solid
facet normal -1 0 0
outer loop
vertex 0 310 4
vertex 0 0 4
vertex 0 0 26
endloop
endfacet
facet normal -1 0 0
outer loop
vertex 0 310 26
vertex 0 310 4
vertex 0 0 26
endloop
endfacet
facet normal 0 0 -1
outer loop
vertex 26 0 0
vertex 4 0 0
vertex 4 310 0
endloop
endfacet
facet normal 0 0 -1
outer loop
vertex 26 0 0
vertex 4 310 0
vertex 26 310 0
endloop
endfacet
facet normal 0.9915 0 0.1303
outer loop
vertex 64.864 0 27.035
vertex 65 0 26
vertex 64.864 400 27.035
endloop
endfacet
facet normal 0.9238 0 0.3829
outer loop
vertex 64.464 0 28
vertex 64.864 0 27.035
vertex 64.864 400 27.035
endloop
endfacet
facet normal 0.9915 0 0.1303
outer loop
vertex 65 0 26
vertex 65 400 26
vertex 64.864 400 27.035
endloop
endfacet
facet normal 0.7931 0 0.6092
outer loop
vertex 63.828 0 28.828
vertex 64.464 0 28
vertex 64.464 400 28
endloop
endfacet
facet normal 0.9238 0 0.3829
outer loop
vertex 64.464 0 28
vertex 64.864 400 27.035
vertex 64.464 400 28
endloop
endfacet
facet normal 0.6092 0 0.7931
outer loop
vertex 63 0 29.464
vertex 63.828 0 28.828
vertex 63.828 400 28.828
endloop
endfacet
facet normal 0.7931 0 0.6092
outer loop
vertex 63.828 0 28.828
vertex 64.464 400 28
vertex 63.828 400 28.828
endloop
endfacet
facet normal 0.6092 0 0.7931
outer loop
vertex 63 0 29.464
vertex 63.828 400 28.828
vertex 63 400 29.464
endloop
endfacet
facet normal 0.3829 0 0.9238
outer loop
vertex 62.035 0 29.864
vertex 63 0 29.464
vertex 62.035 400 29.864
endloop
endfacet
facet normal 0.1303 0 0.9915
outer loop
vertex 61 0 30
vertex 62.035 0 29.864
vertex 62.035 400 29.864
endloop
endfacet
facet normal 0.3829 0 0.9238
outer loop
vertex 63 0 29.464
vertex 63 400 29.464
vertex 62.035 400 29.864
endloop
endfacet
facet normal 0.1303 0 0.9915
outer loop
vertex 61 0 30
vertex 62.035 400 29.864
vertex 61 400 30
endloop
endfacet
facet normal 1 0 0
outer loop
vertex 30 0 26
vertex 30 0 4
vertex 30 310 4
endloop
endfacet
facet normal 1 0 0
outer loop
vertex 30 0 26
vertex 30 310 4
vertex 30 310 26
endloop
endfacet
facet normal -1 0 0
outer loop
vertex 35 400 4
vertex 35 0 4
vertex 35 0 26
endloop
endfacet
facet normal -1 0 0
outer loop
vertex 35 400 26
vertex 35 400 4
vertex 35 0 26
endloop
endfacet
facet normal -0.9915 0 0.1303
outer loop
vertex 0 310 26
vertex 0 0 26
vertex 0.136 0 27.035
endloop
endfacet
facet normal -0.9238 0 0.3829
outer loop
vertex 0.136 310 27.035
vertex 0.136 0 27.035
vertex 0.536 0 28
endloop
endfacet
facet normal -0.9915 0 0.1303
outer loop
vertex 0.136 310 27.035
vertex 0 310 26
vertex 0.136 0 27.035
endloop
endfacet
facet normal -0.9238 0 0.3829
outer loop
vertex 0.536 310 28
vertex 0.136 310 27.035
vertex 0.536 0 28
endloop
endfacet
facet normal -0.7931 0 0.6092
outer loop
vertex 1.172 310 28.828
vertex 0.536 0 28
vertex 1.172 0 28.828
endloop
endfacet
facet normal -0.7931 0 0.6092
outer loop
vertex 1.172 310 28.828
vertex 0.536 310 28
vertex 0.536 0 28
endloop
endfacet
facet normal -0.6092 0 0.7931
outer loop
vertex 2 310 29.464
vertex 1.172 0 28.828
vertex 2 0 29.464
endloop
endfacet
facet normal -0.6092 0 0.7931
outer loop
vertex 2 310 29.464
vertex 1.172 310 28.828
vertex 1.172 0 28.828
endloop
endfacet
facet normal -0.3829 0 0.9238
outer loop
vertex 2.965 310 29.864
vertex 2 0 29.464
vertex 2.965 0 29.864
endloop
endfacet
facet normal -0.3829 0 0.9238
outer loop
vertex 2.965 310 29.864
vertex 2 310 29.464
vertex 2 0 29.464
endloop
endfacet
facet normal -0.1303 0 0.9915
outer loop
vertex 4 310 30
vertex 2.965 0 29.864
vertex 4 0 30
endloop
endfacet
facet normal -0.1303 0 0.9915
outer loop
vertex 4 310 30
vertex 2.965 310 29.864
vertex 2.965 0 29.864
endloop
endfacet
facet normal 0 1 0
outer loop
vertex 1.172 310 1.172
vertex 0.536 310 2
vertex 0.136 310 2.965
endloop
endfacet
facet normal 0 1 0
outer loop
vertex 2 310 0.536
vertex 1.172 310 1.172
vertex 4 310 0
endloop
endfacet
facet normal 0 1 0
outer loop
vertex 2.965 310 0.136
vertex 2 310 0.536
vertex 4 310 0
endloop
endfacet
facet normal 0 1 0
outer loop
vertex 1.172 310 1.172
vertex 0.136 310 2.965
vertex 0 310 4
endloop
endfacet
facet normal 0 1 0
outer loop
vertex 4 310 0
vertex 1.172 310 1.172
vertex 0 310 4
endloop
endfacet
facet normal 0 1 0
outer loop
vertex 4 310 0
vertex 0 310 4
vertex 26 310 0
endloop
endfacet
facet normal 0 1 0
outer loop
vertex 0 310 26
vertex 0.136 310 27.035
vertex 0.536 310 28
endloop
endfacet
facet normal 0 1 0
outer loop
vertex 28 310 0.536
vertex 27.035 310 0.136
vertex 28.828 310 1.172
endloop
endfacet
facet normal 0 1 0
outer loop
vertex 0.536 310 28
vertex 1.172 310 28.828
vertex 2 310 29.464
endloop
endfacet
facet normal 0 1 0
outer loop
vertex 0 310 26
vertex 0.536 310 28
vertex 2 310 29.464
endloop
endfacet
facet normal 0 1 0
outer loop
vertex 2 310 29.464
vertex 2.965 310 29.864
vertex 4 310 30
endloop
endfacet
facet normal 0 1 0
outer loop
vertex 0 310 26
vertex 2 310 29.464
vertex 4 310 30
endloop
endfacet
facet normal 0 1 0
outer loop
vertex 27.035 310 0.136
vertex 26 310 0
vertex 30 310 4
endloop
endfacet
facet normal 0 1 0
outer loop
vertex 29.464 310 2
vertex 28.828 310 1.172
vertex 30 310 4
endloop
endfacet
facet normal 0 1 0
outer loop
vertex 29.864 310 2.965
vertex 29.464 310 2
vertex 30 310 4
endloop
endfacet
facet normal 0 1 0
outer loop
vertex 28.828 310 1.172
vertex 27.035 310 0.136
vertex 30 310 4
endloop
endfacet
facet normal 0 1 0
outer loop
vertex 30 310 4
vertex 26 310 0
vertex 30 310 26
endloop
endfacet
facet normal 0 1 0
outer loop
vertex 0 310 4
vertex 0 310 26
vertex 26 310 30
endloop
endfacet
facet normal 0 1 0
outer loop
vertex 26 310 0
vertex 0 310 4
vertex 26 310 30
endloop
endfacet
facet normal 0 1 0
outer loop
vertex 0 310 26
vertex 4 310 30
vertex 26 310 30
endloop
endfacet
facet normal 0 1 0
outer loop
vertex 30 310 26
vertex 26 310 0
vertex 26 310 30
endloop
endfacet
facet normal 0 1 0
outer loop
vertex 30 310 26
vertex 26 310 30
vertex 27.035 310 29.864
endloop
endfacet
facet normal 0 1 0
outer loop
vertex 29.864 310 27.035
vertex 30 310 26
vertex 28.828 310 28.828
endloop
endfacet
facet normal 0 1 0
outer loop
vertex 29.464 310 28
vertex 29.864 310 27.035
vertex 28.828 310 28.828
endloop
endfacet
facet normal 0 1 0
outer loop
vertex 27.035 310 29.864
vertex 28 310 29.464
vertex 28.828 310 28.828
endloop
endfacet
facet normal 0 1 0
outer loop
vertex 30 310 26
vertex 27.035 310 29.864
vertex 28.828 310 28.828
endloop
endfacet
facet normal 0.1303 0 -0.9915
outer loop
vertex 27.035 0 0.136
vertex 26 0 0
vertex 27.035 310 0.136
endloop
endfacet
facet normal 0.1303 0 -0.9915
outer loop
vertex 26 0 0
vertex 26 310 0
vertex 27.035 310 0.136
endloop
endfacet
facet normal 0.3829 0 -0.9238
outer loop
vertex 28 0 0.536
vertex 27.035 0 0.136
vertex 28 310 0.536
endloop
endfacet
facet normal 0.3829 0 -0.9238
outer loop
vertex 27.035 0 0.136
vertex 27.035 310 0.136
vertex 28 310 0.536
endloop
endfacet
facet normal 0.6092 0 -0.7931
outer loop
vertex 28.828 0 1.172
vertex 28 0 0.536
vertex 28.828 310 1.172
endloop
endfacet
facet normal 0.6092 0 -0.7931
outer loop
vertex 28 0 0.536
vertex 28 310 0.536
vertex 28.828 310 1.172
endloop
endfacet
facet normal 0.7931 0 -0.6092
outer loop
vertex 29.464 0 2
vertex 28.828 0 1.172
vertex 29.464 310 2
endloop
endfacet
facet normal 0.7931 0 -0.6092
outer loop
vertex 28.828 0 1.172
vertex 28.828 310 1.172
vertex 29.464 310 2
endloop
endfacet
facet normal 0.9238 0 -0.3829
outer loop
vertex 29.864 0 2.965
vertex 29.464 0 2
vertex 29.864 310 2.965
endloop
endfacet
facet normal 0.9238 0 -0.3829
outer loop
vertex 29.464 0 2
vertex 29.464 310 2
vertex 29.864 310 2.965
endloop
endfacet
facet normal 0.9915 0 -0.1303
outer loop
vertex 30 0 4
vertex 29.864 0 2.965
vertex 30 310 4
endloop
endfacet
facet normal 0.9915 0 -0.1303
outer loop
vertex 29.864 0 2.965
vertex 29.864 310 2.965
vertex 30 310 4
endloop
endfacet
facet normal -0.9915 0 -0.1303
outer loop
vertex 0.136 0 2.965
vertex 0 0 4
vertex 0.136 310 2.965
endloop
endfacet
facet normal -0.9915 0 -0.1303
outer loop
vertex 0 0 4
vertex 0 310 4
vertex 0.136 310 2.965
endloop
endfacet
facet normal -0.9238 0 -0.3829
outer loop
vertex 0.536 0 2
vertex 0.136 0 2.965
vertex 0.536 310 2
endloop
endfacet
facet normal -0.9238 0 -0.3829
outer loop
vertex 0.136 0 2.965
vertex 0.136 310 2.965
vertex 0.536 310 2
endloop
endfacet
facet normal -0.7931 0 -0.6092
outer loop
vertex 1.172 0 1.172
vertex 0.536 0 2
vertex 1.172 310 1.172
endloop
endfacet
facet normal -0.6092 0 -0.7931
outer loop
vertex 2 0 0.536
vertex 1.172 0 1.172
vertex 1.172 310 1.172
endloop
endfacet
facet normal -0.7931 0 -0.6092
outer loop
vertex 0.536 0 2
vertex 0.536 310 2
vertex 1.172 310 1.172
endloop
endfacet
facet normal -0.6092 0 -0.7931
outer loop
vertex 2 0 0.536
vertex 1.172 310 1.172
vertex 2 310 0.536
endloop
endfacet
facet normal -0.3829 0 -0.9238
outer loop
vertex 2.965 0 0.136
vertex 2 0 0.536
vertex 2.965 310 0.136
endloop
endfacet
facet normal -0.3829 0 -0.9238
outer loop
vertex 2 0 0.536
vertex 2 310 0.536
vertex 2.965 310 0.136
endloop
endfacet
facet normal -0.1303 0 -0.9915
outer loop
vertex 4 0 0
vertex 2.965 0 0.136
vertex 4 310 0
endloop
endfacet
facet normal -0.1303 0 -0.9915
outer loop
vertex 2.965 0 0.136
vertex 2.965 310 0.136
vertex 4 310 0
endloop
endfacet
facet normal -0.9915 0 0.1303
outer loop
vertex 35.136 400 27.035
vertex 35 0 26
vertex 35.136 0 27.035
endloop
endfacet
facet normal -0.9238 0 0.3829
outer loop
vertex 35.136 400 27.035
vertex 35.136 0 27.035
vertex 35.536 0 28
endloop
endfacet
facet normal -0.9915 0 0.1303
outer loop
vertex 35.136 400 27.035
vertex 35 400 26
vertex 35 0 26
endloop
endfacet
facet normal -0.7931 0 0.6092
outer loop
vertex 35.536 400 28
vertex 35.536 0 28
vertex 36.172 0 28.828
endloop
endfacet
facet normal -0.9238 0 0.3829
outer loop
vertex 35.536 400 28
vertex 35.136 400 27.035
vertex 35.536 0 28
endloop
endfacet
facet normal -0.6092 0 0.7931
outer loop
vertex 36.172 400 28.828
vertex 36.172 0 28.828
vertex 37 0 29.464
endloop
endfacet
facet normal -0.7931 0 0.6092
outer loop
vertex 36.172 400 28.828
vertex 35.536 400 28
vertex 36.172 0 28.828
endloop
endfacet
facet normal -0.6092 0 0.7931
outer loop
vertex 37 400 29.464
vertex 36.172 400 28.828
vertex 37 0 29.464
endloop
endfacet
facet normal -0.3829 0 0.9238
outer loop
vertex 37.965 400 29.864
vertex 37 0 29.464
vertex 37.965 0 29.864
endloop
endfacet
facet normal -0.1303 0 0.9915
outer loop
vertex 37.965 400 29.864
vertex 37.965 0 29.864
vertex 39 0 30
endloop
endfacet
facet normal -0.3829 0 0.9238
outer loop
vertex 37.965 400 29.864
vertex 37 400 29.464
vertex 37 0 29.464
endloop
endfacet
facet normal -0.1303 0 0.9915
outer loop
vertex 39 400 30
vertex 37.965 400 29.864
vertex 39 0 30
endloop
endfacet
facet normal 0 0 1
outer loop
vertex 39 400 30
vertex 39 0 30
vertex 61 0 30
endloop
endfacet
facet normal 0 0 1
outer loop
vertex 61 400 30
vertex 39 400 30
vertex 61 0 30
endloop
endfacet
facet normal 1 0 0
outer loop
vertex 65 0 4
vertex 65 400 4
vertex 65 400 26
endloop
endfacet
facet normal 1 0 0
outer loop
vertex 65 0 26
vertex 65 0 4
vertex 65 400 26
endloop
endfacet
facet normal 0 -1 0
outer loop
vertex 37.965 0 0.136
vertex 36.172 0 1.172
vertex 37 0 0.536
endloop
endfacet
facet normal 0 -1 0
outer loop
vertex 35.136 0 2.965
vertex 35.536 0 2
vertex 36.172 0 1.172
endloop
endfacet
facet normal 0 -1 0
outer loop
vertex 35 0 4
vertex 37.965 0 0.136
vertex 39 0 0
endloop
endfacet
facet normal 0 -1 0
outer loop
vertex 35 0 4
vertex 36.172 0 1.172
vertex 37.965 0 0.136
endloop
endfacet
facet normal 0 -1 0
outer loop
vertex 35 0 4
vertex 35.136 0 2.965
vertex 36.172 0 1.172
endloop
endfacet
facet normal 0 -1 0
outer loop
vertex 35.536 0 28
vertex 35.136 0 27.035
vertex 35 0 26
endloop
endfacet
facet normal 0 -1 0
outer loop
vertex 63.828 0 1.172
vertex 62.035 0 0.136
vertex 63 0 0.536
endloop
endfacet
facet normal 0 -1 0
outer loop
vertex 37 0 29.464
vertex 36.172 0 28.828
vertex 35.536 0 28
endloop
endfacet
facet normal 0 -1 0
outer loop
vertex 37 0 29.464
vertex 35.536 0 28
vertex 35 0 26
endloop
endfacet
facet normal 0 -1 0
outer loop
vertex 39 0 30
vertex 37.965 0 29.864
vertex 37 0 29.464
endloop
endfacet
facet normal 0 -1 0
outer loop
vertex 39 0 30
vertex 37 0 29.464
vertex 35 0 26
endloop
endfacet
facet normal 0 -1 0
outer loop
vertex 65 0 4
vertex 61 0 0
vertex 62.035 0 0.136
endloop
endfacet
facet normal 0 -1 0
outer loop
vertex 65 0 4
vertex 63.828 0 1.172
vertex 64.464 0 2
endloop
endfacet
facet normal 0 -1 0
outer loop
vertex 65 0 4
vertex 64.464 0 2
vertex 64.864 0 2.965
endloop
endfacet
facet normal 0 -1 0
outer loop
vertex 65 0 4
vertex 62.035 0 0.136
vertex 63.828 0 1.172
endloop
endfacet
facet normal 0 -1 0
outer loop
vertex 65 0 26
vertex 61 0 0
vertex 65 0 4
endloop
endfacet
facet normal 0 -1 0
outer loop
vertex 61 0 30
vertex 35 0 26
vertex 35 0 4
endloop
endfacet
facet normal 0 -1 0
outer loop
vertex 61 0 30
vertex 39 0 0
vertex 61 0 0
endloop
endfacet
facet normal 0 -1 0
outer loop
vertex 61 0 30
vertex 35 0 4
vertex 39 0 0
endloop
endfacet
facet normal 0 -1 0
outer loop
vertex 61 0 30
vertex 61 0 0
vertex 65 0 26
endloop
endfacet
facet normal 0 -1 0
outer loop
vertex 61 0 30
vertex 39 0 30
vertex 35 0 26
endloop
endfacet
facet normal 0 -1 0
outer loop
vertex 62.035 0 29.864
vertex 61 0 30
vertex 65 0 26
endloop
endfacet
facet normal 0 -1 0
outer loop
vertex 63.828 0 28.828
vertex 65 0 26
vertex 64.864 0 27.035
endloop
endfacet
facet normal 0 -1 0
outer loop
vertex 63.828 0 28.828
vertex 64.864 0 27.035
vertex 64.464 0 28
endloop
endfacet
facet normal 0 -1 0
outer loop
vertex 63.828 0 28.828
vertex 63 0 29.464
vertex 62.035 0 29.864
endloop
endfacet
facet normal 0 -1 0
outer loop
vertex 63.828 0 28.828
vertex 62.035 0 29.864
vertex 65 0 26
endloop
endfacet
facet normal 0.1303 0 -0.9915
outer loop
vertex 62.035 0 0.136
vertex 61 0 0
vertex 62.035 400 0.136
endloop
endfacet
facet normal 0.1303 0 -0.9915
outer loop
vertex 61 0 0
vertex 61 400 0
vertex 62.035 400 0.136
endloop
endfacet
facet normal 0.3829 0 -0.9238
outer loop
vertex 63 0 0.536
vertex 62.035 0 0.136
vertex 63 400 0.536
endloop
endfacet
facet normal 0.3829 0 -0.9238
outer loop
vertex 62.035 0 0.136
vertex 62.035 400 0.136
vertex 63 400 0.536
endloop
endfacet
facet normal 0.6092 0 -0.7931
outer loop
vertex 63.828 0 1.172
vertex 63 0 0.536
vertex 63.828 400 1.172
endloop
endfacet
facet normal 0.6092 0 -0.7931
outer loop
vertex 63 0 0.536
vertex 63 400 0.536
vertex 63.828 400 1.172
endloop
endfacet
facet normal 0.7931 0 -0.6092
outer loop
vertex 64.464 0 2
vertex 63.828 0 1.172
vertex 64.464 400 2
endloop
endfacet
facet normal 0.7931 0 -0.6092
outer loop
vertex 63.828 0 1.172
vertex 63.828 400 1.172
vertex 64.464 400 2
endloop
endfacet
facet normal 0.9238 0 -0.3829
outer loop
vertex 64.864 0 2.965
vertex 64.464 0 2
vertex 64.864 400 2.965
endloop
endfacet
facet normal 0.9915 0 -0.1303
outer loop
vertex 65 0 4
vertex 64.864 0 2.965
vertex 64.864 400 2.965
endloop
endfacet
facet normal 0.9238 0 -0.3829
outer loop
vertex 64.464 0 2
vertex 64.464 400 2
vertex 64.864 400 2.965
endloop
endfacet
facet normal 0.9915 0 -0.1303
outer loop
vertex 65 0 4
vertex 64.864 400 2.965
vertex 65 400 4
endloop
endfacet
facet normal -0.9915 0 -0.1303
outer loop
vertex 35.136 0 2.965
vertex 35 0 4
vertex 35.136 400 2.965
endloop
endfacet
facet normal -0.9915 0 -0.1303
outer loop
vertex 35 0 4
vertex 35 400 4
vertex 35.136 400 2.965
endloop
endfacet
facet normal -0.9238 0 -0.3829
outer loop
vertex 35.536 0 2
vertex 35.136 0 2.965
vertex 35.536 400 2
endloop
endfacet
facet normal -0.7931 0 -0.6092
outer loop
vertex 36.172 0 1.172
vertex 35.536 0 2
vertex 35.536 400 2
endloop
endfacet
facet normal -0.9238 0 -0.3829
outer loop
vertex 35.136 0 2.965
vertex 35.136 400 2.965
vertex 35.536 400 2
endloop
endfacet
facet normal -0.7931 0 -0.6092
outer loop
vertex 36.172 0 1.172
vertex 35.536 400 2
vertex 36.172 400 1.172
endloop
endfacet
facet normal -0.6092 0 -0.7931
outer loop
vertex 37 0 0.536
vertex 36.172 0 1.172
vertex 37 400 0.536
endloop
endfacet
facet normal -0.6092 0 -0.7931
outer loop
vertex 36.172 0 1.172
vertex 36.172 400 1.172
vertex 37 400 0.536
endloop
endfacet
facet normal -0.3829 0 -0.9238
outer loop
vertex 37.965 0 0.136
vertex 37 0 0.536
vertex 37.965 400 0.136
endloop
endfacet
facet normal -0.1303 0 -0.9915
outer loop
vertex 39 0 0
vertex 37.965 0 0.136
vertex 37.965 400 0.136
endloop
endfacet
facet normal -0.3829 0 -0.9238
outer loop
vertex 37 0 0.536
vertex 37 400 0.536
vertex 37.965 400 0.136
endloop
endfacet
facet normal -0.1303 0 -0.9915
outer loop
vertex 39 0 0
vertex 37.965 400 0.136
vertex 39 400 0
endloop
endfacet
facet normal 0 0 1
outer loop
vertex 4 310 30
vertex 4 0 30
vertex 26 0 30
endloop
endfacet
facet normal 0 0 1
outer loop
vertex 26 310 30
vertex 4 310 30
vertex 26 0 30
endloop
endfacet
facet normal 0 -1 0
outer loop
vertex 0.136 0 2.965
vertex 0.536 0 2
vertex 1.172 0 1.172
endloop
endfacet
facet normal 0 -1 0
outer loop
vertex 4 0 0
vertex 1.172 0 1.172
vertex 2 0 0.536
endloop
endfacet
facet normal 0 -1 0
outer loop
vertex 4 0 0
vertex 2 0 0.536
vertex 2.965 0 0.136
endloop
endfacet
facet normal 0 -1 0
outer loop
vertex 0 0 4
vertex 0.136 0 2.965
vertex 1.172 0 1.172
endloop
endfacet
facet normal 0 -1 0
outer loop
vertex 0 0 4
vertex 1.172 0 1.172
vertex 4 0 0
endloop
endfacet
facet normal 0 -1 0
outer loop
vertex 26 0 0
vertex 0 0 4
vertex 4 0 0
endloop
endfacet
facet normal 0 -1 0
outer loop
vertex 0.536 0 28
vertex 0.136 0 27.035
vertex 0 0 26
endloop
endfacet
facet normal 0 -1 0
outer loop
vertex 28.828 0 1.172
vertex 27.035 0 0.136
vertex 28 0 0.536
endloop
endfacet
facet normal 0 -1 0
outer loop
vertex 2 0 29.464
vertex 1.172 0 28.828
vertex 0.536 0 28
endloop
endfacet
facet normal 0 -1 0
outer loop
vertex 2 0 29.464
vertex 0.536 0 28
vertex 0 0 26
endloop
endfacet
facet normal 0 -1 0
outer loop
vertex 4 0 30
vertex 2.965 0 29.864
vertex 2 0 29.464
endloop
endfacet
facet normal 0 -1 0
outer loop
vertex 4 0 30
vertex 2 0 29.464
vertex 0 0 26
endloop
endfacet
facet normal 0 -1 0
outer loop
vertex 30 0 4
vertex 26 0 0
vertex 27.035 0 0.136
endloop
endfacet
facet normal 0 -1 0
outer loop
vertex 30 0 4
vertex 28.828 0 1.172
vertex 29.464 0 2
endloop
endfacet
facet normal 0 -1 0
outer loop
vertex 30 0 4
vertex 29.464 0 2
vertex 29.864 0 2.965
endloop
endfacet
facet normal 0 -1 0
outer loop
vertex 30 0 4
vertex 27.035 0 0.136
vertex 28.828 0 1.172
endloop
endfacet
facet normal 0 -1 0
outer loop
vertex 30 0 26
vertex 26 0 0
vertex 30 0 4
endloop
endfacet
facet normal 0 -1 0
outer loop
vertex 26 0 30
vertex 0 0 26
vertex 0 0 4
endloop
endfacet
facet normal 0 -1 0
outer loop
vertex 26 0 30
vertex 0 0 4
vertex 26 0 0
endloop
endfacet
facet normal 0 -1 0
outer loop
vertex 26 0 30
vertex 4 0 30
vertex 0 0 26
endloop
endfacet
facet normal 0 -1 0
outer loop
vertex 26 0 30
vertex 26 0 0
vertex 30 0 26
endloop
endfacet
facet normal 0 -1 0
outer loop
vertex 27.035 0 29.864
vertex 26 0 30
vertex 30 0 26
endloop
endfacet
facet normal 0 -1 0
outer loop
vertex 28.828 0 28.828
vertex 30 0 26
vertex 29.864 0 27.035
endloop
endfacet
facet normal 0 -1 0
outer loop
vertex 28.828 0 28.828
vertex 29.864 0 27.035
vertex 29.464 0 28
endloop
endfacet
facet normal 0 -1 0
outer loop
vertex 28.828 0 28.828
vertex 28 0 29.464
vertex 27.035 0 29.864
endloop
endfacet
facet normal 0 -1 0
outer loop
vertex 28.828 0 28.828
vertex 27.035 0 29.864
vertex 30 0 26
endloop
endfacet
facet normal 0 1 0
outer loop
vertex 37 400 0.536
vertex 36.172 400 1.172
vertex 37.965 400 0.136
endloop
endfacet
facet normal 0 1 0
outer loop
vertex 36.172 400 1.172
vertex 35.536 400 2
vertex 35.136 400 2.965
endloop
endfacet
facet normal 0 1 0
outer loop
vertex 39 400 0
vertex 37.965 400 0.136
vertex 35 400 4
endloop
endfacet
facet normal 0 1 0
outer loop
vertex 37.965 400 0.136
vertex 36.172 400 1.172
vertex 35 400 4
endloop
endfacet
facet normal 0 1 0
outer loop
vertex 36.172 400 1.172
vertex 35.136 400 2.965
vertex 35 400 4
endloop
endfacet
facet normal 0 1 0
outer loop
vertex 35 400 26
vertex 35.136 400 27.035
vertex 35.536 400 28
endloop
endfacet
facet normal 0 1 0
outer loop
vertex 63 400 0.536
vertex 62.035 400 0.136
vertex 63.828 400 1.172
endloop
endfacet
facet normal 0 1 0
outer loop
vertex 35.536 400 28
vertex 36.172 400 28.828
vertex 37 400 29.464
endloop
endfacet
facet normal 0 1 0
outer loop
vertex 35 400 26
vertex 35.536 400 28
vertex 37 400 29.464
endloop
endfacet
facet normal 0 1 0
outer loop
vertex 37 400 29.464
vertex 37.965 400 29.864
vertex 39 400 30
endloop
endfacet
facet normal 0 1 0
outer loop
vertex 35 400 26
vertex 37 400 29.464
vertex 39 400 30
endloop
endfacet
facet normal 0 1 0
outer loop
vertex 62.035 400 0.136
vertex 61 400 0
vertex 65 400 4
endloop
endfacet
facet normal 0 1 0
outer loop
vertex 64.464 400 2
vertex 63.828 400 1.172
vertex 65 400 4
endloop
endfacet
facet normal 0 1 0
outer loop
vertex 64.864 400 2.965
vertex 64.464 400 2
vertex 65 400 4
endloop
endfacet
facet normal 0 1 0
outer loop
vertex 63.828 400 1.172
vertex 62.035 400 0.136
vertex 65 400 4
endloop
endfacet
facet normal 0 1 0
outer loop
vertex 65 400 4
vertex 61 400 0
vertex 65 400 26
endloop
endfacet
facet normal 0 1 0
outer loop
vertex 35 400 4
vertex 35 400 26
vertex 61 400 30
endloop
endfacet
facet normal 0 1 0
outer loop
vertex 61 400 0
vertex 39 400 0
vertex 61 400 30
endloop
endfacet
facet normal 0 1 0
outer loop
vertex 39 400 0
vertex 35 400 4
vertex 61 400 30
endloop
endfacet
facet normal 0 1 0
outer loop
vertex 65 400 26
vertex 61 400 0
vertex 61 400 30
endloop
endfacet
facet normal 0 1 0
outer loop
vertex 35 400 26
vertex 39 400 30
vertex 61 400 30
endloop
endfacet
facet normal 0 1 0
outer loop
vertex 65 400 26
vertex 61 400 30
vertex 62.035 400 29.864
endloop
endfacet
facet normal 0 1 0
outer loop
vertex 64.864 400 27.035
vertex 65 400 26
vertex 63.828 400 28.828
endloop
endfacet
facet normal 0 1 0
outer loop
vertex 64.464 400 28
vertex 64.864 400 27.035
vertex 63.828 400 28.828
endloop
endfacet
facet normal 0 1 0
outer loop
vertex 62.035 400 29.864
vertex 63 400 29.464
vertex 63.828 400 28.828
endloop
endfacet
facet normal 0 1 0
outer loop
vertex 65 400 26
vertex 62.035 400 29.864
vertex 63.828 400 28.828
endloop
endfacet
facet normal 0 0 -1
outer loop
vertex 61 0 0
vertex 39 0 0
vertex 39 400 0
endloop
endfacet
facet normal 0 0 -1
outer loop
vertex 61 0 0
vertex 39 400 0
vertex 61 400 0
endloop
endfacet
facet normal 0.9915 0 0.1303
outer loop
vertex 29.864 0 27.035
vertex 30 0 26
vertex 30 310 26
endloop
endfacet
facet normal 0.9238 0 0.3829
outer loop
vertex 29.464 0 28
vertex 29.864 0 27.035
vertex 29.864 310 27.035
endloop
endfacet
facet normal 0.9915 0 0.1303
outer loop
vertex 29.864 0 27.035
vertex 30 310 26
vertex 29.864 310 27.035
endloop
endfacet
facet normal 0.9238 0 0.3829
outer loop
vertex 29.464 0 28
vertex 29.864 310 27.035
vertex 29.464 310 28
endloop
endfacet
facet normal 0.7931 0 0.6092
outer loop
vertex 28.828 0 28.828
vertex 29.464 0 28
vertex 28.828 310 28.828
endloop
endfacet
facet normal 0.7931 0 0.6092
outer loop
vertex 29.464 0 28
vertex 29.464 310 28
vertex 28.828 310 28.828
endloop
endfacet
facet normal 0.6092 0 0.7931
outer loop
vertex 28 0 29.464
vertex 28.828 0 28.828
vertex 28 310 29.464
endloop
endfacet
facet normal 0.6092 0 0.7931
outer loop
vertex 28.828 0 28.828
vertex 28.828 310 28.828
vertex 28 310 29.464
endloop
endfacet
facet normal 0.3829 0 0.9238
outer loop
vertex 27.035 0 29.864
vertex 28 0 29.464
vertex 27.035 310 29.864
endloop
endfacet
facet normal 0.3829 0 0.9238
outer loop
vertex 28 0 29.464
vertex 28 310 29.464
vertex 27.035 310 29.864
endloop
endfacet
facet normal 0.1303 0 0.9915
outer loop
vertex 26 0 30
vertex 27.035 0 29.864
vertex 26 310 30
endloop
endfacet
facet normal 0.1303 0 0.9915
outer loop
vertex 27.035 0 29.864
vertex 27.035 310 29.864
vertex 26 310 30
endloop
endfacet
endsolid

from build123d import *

# Parameters (mm, degrees)
F0_W     = 30
F0_H     = 30
F1_DEPTH = 310
F2_R     = 4
F3_W     = 30
F3_H     = 30
F4_DEPTH = 400
F5_R     = 4


with BuildPart() as f1:
    # F0 (on Front) → F1 (new body)
    with BuildSketch(Plane.XZ):
        with Locations((15, 15)):
            Rectangle(F0_W, F0_H)
    extrude(amount=-F1_DEPTH)

    # F2
    f2_edges = [f1.edges().sort_by_distance(p)[0] for p in [
        (30, 155, 30),
        (30, 155, 0),
        (0, 155, 30),
        (0, 155, 0),
    ]]
    fillet(f2_edges, radius=F2_R)


with BuildPart() as f4:
    # F3 (on Front) → F4 (new body)
    with BuildSketch(Plane.XZ):
        with Locations((50, 15)):
            Rectangle(F3_W, F3_H)
    extrude(amount=-F4_DEPTH)

    # F5
    f5_edges = [f4.edges().sort_by_distance(p)[0] for p in [
        (35, 200, 30),
        (65, 200, 30),
        (65, 200, 0),
        (35, 200, 0),
    ]]
    fillet(f5_edges, radius=F5_R)


solid = Compound([f1.part, f4.part])
